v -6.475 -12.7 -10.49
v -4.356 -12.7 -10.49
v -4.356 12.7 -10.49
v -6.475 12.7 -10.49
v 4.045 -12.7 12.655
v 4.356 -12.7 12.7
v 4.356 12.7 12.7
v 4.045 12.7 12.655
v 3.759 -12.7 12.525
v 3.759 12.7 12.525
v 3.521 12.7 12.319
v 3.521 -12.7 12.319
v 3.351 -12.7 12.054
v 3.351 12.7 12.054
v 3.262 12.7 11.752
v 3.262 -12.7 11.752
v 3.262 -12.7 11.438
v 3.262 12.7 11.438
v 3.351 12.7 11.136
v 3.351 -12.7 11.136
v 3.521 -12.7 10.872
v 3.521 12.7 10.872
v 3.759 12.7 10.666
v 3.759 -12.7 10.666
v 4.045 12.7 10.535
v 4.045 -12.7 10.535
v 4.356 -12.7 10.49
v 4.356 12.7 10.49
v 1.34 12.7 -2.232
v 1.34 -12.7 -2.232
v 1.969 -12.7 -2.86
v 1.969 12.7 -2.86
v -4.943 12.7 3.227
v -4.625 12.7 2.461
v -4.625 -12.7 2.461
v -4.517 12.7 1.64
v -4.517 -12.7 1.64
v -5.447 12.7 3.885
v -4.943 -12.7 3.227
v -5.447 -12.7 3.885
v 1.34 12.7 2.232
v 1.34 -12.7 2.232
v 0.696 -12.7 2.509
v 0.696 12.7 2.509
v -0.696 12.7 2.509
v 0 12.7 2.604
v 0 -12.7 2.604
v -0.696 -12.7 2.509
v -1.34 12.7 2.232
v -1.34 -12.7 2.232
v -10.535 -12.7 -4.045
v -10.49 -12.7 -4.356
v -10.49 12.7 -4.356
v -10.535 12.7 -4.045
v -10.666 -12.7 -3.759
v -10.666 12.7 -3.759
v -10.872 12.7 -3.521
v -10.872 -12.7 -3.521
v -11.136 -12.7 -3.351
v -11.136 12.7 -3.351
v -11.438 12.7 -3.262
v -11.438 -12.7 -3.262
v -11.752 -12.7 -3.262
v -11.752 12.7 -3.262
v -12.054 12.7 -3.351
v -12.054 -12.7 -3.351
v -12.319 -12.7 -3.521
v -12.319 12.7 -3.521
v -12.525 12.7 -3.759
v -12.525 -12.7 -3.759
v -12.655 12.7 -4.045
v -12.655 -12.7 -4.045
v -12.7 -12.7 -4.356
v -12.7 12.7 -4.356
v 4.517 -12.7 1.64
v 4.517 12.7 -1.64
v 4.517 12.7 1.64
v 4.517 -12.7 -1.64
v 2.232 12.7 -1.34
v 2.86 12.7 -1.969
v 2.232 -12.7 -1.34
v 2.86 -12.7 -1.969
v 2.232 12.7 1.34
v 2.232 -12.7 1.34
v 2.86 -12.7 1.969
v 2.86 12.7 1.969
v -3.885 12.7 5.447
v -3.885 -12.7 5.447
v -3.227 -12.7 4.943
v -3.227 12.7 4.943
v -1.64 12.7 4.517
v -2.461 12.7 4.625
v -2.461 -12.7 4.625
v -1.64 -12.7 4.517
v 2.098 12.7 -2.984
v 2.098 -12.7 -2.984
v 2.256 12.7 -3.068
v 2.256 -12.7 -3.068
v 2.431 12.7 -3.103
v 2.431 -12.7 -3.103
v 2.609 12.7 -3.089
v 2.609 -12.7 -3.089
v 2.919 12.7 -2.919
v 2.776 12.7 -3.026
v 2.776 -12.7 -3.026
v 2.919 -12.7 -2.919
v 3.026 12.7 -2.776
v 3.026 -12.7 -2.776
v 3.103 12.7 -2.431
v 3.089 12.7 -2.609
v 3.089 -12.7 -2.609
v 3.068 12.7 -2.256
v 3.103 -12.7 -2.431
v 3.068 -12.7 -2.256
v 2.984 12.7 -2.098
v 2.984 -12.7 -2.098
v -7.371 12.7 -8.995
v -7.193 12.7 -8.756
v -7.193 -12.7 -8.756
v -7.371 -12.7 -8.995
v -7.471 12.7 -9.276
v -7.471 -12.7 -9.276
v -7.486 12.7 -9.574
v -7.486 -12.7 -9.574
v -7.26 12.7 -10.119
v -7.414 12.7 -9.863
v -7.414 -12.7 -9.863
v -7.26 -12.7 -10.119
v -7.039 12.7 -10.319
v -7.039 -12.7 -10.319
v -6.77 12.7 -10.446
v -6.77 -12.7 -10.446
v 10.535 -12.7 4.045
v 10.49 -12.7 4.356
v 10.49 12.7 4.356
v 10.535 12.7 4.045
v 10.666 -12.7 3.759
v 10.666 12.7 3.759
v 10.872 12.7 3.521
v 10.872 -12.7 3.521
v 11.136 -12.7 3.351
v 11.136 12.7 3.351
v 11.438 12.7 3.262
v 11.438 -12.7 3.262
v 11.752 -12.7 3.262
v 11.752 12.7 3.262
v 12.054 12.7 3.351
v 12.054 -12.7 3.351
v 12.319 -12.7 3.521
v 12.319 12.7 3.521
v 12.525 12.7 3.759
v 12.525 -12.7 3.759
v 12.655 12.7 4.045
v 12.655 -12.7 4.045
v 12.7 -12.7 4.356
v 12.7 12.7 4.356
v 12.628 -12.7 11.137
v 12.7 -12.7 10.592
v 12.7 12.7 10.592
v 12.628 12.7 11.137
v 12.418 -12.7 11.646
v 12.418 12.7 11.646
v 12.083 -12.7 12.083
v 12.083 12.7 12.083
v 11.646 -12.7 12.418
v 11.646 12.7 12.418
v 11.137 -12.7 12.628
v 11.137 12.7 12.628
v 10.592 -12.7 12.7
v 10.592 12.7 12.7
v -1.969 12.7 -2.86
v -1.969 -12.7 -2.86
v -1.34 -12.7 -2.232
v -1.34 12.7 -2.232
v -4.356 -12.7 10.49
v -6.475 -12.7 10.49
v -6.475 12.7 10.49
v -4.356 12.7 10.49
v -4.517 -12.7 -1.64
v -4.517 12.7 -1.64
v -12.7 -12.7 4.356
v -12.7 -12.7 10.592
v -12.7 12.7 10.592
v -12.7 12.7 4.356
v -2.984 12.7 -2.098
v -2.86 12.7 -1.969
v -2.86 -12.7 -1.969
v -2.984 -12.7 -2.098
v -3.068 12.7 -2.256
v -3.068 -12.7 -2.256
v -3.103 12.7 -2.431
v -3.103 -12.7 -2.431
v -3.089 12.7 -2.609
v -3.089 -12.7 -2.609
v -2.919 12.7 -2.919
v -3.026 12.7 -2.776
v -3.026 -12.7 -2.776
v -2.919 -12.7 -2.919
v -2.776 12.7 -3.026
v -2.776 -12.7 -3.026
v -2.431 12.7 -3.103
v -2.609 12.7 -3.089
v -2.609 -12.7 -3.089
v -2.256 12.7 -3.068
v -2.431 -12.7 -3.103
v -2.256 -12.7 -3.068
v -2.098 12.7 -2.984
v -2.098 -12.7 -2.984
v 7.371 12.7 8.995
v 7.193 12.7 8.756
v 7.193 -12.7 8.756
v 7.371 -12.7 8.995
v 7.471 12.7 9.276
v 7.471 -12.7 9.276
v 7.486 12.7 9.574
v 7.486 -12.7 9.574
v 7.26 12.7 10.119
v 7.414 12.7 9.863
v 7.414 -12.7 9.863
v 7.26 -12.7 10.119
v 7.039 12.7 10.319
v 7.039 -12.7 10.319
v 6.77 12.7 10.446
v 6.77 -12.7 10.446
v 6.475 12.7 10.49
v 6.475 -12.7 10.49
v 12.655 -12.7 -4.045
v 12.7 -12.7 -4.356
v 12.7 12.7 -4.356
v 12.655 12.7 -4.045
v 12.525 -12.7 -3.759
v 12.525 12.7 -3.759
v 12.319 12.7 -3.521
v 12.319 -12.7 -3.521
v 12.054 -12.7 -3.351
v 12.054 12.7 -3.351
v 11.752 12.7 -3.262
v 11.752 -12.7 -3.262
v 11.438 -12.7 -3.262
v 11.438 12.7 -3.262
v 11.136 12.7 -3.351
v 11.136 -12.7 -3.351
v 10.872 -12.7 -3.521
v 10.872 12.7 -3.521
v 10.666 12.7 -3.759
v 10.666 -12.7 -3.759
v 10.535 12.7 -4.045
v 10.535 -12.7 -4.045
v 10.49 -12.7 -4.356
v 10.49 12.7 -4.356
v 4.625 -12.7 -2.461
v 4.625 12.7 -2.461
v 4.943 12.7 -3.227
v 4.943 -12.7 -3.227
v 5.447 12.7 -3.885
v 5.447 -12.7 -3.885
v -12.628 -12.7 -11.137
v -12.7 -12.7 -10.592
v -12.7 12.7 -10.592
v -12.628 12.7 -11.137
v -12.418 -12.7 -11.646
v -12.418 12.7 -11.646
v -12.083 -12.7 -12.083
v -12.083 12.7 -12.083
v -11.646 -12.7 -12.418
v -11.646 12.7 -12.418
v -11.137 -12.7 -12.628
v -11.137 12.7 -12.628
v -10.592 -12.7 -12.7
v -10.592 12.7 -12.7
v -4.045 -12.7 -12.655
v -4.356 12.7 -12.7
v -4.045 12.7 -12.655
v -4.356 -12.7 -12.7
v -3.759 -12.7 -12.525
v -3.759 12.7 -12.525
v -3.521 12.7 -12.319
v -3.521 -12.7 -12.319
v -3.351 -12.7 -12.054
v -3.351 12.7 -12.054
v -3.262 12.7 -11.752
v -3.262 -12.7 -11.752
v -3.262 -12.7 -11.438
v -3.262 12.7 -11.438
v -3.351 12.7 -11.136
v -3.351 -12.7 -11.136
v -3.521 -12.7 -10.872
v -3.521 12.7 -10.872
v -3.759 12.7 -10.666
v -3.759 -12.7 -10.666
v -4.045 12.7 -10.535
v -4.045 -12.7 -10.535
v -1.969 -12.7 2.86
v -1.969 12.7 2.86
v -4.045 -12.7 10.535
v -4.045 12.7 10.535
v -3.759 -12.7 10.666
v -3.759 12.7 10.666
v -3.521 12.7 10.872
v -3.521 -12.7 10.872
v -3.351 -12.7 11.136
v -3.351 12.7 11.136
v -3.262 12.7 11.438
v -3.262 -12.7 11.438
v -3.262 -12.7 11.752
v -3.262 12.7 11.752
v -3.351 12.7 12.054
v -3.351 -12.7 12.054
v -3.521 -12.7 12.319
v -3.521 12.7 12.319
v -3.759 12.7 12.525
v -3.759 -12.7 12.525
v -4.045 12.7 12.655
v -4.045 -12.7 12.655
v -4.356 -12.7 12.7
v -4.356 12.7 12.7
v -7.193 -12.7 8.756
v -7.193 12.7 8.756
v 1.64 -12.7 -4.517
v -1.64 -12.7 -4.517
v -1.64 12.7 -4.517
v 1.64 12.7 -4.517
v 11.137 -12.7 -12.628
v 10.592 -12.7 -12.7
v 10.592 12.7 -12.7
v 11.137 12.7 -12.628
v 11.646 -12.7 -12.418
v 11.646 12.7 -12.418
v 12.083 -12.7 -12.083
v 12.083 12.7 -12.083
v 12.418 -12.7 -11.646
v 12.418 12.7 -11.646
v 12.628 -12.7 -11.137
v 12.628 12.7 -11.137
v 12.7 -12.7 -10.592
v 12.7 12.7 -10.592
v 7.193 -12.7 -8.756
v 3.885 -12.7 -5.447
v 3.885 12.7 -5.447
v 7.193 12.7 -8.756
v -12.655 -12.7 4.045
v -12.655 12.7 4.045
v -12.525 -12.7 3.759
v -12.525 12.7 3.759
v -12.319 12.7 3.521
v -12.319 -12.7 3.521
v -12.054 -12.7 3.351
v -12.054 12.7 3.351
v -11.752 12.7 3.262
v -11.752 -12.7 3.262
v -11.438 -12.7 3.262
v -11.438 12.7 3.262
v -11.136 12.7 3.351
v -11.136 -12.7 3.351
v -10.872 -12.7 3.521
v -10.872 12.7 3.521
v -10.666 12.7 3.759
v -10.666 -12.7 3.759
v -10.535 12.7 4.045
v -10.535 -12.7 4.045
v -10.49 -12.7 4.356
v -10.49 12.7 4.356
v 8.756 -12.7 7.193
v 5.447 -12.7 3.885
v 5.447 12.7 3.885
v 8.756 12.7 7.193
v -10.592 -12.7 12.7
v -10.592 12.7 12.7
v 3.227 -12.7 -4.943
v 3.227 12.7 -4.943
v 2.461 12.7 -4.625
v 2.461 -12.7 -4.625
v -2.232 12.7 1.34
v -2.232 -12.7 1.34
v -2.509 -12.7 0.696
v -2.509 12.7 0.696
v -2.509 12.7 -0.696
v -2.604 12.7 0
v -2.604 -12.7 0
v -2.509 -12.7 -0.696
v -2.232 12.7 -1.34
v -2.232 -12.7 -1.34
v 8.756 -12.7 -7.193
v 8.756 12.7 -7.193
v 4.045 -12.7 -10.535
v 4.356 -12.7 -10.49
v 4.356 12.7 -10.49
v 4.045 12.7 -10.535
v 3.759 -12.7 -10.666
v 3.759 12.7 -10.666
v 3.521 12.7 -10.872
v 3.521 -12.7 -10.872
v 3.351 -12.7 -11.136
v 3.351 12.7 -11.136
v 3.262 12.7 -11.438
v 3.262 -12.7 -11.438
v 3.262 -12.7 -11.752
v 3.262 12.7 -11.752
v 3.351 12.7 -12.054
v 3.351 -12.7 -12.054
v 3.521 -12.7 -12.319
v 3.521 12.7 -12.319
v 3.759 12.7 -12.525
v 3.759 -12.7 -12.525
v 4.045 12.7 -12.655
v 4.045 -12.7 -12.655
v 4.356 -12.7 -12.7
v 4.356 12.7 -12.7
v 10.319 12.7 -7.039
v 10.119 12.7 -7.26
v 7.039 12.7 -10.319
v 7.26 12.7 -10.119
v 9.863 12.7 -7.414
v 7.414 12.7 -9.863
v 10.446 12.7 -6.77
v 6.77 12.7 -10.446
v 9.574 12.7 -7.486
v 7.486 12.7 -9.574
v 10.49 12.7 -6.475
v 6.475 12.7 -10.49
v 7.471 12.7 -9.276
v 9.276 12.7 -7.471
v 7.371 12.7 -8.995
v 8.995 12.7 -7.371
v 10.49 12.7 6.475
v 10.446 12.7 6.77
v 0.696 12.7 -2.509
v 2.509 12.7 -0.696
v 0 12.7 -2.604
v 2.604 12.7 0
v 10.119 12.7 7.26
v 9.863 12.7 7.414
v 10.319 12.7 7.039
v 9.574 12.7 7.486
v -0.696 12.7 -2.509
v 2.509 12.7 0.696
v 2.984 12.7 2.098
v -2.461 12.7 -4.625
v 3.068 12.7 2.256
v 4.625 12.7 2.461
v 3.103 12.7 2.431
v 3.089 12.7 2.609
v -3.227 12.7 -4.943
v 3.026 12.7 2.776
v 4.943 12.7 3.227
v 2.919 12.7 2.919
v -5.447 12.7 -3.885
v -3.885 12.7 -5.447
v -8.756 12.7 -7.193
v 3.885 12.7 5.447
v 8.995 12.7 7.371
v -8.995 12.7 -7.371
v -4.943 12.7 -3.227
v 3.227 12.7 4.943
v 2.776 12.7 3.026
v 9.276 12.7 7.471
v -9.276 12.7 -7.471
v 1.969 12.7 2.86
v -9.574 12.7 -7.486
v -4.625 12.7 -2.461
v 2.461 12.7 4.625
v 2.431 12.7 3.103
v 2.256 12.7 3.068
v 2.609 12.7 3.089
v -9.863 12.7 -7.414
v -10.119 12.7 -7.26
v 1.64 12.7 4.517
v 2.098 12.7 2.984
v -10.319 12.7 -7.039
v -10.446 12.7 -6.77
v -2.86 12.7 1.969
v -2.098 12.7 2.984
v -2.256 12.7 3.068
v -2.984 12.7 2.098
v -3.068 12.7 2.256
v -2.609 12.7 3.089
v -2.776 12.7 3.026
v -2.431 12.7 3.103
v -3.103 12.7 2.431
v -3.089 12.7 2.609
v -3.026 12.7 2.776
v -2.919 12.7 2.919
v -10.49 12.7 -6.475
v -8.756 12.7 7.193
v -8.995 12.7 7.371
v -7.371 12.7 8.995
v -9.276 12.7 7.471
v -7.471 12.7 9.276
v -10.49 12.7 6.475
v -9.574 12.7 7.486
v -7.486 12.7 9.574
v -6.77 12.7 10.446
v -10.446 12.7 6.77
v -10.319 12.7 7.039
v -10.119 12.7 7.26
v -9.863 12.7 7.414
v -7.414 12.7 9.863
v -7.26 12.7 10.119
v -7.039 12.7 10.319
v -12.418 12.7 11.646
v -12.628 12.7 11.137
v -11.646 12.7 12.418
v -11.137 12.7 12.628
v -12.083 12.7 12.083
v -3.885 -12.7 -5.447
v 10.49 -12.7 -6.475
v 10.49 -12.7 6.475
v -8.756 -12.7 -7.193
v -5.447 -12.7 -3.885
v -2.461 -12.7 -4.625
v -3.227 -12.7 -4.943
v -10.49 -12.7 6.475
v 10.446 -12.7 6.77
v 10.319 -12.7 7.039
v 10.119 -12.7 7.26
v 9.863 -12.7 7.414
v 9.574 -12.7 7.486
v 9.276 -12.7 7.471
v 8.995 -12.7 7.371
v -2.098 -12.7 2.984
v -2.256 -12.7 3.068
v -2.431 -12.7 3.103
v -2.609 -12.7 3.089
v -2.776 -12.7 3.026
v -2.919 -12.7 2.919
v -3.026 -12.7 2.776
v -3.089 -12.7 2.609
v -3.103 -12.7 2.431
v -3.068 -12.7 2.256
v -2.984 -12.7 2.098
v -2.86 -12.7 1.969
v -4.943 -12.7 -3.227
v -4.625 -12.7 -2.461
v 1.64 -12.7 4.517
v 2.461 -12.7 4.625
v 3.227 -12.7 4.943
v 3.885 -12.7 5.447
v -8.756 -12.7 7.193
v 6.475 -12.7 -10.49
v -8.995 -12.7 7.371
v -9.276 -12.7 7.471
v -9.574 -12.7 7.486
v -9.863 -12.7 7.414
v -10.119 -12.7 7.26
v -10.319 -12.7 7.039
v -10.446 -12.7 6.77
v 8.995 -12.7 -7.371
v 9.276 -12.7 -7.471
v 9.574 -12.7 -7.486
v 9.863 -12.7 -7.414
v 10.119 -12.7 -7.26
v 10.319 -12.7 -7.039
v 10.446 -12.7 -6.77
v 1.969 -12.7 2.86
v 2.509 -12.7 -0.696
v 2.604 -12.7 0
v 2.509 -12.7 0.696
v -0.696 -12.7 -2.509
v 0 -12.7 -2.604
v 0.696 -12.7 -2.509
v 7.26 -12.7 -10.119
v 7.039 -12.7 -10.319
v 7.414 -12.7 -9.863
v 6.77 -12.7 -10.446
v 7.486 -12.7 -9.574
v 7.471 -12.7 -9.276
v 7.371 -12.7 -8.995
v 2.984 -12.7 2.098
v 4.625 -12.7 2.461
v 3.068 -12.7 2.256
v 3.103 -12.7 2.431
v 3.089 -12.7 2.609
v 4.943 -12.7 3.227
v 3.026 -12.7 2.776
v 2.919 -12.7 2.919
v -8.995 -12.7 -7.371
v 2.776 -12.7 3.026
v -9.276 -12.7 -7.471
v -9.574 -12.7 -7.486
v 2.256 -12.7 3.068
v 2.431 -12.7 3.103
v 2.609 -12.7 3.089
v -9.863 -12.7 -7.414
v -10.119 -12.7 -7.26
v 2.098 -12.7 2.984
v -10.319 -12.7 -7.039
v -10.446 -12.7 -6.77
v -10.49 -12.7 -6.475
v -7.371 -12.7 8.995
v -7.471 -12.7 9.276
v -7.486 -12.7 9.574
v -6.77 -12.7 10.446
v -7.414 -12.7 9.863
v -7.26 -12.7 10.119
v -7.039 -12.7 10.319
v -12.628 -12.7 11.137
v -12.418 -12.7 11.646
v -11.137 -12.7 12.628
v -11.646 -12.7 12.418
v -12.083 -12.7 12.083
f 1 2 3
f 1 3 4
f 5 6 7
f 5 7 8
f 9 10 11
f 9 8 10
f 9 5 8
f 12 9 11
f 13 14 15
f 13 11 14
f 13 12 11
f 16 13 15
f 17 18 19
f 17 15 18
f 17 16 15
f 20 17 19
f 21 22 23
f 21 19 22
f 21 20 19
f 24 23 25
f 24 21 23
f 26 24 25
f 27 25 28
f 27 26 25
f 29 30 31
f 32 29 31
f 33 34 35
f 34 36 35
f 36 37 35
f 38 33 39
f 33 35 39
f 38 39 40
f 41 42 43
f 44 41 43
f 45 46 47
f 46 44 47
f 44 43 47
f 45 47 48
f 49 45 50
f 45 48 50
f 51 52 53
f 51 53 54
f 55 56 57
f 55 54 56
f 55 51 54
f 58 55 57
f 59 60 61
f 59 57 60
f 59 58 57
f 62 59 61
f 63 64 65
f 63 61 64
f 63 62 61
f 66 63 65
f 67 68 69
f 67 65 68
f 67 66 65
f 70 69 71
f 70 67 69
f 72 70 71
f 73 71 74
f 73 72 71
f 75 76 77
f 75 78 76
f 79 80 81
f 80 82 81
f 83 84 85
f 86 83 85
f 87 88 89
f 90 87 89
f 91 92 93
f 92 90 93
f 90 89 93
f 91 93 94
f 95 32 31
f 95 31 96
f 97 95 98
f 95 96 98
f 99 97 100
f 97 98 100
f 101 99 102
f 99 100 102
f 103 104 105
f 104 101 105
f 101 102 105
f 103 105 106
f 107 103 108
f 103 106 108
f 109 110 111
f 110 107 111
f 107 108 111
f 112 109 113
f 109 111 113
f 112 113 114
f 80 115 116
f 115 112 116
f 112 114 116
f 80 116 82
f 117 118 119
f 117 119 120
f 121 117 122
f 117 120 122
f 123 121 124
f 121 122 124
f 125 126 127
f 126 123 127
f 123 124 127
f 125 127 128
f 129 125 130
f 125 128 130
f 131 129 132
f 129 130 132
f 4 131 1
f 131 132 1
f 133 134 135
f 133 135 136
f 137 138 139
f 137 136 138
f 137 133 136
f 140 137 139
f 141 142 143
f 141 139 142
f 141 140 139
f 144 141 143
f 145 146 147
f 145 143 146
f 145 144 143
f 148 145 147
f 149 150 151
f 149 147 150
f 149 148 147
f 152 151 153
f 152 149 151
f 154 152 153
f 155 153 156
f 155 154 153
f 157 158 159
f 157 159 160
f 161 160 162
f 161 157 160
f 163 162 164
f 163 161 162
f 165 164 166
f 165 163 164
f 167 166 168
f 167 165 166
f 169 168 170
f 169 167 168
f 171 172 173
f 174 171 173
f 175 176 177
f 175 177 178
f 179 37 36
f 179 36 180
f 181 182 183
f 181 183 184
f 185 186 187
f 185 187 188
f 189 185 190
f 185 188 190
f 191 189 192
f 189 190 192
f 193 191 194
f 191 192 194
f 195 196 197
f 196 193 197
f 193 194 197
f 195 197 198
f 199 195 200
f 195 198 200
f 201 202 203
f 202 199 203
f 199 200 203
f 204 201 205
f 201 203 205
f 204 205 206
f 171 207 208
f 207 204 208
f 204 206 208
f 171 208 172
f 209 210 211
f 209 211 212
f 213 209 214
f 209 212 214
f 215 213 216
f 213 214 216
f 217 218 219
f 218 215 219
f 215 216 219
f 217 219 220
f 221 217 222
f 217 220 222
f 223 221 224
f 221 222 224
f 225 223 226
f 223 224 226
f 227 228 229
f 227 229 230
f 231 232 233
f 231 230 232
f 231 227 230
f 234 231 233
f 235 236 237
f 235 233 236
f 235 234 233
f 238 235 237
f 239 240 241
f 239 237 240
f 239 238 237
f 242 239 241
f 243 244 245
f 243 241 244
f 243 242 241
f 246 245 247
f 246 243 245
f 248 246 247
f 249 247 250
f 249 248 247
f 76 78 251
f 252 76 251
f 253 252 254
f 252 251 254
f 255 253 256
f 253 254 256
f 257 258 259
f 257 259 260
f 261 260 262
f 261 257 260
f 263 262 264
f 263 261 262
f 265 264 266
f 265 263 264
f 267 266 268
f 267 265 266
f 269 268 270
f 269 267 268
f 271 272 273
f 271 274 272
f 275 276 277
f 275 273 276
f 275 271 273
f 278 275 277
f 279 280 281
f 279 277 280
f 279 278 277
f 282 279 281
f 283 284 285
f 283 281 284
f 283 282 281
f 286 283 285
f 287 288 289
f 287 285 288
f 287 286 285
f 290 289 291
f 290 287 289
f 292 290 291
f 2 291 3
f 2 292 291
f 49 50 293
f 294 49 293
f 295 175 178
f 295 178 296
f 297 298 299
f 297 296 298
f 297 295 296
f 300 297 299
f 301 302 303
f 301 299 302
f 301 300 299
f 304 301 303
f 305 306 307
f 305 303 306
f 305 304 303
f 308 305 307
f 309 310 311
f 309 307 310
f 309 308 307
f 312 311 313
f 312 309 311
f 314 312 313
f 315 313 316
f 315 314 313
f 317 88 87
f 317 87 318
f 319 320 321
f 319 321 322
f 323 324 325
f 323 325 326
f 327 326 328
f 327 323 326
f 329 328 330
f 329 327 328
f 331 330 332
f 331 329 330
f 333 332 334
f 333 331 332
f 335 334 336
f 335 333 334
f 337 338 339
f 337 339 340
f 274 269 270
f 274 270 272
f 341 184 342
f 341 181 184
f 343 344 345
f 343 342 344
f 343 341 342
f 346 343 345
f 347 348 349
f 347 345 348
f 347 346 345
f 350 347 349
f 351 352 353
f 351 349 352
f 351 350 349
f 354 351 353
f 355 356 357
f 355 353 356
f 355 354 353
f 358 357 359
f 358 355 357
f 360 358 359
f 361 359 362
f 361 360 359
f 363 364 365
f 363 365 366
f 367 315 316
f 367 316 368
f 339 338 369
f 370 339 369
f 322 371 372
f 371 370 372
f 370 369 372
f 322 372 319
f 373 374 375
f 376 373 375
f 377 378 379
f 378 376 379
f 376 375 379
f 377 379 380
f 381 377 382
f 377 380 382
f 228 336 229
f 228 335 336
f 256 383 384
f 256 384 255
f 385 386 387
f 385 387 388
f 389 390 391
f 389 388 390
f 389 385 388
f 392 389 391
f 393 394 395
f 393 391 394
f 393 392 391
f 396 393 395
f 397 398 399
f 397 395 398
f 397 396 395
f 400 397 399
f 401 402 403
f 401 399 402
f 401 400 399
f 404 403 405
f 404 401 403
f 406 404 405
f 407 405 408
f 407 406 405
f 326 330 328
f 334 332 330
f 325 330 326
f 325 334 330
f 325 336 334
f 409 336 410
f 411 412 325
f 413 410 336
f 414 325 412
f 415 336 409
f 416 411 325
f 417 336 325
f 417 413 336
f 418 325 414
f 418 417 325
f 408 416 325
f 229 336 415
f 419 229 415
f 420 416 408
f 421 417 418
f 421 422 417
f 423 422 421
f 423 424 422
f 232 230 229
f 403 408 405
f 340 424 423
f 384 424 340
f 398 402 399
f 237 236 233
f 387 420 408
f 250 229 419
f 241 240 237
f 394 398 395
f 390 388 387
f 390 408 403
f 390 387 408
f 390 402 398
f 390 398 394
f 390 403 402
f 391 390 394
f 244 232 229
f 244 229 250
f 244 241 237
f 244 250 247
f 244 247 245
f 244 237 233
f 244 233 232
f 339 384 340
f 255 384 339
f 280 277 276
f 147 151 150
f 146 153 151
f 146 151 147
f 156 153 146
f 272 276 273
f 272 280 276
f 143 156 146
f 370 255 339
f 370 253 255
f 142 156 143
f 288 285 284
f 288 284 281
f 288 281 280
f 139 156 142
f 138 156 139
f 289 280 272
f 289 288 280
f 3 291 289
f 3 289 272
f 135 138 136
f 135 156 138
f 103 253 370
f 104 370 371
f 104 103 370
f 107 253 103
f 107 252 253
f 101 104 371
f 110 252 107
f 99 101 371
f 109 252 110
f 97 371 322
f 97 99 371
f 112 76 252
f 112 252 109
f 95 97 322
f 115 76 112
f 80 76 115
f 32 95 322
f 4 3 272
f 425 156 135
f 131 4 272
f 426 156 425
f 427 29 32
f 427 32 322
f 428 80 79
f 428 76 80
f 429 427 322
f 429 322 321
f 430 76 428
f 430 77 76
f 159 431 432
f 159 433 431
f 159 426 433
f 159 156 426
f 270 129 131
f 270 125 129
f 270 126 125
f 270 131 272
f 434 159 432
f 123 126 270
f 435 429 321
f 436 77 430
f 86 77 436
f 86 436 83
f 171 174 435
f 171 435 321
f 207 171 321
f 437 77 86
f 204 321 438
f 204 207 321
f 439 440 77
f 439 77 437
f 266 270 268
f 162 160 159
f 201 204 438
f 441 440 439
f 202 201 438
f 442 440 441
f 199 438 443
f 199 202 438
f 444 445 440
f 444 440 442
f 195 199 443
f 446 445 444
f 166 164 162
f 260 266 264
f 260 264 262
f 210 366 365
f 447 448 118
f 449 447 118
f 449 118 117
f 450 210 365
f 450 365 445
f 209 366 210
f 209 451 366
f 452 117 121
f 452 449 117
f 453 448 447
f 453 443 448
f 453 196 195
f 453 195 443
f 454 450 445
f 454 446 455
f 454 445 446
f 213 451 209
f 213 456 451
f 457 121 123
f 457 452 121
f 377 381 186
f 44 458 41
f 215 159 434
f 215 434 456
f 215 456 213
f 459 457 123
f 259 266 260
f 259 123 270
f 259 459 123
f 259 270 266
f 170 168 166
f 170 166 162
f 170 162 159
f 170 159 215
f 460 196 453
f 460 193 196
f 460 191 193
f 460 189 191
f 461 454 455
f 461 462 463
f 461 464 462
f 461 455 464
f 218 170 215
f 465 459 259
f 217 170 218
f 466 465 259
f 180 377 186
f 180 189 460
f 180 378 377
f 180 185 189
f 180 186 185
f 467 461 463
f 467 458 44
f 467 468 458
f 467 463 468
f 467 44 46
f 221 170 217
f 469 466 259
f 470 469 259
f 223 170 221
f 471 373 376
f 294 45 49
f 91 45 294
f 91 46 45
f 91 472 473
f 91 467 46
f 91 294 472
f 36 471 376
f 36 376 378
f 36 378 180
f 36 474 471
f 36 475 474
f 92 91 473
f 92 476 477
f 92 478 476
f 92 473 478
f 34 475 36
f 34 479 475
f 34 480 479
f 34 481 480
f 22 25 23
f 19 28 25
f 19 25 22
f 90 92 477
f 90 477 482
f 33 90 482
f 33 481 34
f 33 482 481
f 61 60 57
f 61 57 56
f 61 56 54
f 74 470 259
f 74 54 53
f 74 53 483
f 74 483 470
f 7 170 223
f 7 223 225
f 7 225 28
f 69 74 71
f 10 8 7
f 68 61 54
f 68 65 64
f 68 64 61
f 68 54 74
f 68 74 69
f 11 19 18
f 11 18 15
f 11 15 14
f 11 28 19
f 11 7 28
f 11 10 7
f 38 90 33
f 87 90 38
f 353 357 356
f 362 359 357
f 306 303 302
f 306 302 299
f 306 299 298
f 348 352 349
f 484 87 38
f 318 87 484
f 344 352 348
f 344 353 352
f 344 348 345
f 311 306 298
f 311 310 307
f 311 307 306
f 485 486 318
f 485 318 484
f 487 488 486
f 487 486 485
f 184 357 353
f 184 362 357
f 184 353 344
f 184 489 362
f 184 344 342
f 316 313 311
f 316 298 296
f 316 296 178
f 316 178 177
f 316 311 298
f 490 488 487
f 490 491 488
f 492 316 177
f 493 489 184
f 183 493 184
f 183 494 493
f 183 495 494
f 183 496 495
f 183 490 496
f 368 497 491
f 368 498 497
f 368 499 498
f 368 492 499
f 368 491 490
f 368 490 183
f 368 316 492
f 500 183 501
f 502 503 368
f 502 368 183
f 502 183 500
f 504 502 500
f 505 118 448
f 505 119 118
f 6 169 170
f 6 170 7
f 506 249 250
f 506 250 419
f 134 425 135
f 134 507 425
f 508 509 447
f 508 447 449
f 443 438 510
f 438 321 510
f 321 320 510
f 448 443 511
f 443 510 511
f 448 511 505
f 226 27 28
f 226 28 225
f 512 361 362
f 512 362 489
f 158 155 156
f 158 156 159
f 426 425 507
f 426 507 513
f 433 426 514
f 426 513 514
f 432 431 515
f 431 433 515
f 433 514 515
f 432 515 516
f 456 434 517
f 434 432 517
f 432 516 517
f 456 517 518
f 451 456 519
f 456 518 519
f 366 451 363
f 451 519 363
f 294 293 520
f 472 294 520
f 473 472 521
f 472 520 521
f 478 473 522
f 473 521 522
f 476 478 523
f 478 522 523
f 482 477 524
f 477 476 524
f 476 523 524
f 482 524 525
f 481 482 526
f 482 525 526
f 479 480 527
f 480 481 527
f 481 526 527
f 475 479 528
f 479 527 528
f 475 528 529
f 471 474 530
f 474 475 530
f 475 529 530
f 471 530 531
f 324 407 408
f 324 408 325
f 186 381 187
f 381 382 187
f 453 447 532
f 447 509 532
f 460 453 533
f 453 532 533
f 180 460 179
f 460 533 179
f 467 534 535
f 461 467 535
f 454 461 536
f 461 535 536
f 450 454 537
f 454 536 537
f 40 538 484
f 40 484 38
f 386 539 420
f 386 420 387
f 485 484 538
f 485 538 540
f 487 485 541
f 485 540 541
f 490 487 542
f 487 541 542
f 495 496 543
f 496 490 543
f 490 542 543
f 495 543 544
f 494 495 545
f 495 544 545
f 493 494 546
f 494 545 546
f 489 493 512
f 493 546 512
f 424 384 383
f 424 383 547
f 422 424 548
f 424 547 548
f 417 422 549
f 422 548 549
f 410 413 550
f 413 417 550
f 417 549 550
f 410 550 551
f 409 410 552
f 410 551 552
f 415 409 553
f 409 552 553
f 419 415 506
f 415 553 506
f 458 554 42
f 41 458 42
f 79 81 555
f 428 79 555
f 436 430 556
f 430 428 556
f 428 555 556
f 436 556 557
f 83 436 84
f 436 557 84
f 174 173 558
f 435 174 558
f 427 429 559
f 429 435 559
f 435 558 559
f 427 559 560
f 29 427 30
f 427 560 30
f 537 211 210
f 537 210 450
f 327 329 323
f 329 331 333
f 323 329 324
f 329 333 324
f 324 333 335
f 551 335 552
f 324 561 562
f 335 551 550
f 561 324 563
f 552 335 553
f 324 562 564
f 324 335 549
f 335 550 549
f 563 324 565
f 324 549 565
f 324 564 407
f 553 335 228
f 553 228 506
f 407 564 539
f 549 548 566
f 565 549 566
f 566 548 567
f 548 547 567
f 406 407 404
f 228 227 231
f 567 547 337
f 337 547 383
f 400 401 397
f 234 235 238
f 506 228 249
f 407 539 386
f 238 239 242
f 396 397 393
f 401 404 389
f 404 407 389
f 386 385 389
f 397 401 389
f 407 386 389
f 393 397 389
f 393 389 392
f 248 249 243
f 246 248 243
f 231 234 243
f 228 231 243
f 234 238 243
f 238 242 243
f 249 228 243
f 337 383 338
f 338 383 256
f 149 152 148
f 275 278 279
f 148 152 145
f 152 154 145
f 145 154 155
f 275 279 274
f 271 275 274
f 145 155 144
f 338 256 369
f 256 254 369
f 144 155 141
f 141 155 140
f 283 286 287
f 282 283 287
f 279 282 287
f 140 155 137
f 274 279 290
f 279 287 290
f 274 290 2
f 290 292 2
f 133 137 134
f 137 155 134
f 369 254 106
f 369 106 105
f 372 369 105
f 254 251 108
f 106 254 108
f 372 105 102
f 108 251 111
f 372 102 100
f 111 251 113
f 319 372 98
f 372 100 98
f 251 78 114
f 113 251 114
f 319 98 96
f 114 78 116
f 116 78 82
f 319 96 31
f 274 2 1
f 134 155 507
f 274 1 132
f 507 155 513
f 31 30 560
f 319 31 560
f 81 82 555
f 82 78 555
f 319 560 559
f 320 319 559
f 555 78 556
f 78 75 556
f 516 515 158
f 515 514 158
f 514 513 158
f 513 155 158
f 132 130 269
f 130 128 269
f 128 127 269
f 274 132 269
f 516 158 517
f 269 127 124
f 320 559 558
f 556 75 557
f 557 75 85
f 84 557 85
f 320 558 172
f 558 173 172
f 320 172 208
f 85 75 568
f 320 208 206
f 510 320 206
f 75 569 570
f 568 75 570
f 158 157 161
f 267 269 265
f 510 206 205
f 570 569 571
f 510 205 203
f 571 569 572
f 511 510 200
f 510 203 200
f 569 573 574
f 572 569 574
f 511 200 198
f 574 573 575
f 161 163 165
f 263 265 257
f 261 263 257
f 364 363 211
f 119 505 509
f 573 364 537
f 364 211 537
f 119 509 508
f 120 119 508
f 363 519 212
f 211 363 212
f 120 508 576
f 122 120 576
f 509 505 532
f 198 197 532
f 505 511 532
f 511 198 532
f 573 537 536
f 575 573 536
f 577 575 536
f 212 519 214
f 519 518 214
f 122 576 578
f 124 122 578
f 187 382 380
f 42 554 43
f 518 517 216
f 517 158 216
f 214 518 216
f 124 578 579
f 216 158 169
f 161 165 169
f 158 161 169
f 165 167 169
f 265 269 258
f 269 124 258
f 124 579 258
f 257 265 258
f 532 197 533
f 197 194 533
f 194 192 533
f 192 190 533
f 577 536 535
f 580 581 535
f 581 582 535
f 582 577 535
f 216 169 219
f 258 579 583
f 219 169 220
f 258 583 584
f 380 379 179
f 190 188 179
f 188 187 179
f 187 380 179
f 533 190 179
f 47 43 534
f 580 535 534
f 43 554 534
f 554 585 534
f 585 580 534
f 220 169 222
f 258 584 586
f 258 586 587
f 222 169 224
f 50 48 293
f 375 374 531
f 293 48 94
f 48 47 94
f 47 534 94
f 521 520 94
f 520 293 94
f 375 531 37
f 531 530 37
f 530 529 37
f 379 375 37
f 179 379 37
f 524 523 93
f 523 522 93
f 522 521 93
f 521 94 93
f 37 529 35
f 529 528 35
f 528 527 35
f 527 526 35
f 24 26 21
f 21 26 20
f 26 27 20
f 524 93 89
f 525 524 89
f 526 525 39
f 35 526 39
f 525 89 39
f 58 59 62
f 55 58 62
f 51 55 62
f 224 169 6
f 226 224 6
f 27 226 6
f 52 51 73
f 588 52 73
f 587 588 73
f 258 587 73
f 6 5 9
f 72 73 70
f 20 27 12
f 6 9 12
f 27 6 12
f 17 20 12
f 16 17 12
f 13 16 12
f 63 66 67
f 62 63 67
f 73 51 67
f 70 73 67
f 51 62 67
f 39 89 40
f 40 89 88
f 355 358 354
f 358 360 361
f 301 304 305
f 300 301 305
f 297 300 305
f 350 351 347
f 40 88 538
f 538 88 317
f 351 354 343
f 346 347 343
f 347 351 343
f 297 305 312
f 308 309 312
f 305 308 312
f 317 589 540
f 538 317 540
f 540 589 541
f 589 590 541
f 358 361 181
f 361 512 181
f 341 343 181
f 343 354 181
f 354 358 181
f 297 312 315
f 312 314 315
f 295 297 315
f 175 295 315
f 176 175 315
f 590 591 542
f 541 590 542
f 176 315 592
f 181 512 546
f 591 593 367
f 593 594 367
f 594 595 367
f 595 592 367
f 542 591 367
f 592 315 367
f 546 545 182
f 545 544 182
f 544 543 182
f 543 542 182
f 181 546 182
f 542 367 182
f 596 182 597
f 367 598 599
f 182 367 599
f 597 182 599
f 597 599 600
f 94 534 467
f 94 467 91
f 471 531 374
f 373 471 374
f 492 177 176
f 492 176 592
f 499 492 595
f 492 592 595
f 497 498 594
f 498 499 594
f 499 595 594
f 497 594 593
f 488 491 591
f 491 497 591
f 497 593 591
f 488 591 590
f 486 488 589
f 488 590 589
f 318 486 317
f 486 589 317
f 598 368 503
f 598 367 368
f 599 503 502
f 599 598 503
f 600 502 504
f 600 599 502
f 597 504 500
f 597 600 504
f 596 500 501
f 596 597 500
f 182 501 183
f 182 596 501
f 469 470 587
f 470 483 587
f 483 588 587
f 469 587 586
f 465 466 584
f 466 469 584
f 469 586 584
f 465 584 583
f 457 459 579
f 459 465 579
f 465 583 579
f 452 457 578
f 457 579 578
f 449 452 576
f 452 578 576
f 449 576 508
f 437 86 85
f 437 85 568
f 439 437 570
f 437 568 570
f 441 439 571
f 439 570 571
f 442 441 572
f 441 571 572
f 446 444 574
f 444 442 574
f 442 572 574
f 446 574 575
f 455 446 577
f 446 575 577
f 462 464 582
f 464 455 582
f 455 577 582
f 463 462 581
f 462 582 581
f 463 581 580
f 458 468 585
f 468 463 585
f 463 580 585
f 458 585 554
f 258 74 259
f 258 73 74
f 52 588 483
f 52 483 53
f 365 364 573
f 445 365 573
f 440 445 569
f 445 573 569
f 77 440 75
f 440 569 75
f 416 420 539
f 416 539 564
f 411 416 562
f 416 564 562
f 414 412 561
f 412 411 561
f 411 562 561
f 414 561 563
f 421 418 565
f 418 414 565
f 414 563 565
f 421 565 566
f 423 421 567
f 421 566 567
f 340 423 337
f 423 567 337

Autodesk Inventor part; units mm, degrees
ref_plane "YZ Plane" through (0, 0, 0) normal (1, 0, 0) x (0, 1, 0)
ref_plane "XZ Plane" through (0, 0, 0) normal (0, 1, 0) x (-1, 0, 0)
ref_plane "XY Plane" through (0, 0, 0) normal (0, 0, 1) x (1, 0, 0)
sketch "Sketch1" plane through (0, 0, 0) normal (0, 1, 0) x (-1, 0, 0)
  arc A0 (-1.9692, 2.8605) -> (-2.8605, 1.9692) centre (-2.4696, 2.4696) ccw
  line L0 (-2.2319, 1.3405) -> (-2.8605, 1.9692)
  arc A1 (-2.2319, 1.3405) -> (-2.2319, -1.3405) centre (0, 0) ccw
  line L1 (-2.8605, -1.9692) -> (-2.2319, -1.3405)
  arc A2 (-2.8605, -1.9692) -> (-1.9692, -2.8605) centre (-2.4696, -2.4696) ccw
  line L2 (-1.3405, -2.2319) -> (-1.9692, -2.8605)
  arc A3 (-1.3405, -2.2319) -> (1.3405, -2.2319) centre (0, 0) ccw
  line L3 (1.9692, -2.8605) -> (1.3405, -2.2319)
  arc A4 (1.9692, -2.8605) -> (2.8605, -1.9692) centre (2.4696, -2.4696) ccw
  line L4 (2.2319, -1.3405) -> (2.8605, -1.9692)
  arc A5 (2.2319, -1.3405) -> (2.2319, 1.3405) centre (0, 0) ccw
  line L5 (2.8605, 1.9692) -> (2.2319, 1.3405)
  arc A6 (2.8605, 1.9692) -> (1.9692, 2.8605) centre (2.4696, 2.4696) ccw
  line L6 (1.3405, 2.2319) -> (1.9692, 2.8605)
  arc A7 (1.3405, 2.2319) -> (-1.3405, 2.2319) centre (0, 0) ccw
  line L7 (-1.9692, 2.8605) -> (-1.3405, 2.2319)
  arc A8 (-1.6396, -4.5172) -> (-3.8846, -5.4471) centre (-1.6396, -7.6922) ccw
  line L8 (-3.8846, -5.4471) -> (-7.1933, -8.7558)
  arc A9 (-7.1933, -8.7558) -> (-6.4749, -10.4902) centre (-6.4749, -9.4742) ccw
  line L9 (-6.4749, -10.4902) -> (-4.3561, -10.4902)
  arc A10 (-4.3561, -12.7) -> (-4.3561, -10.4902) centre (-4.3561, -11.5951) ccw
  line L10 (-4.3561, -12.7) -> (-10.5918, -12.7)
  arc A11 (-12.7, -10.5918) -> (-10.5918, -12.7) centre (-10.5918, -10.5918) ccw
  line L11 (-12.7, -10.5918) -> (-12.7, -4.3561)
  arc A12 (-10.4902, -4.3561) -> (-12.7, -4.3561) centre (-11.5951, -4.3561) ccw
  line L12 (-10.4902, -4.3561) -> (-10.4902, -6.4749)
  arc A13 (-10.4902, -6.4749) -> (-8.7558, -7.1933) centre (-9.4742, -6.4749) ccw
  line L13 (-8.7558, -7.1933) -> (-5.4471, -3.8846)
  arc A14 (-5.4471, -3.8846) -> (-4.5172, -1.6396) centre (-7.6922, -1.6396) ccw
  line L14 (-4.5172, -1.6396) -> (-4.5172, 1.6396)
  arc A15 (-4.5172, 1.6396) -> (-5.4471, 3.8846) centre (-7.6922, 1.6396) ccw
  line L15 (-5.4471, 3.8846) -> (-8.7558, 7.1933)
  arc A16 (-8.7558, 7.1933) -> (-10.4902, 6.4749) centre (-9.4742, 6.4749) ccw
  line L16 (-10.4902, 6.4749) -> (-10.4902, 4.3561)
  arc A17 (-12.7, 4.3561) -> (-10.4902, 4.3561) centre (-11.5951, 4.3561) ccw
  line L17 (-12.7, 4.3561) -> (-12.7, 10.5918)
  arc A18 (-10.5918, 12.7) -> (-12.7, 10.5918) centre (-10.5918, 10.5918) ccw
  line L18 (-10.5918, 12.7) -> (-4.3561, 12.7)
  arc A19 (-4.3561, 10.4902) -> (-4.3561, 12.7) centre (-4.3561, 11.5951) ccw
  line L19 (-4.3561, 10.4902) -> (-6.4749, 10.4902)
  arc A20 (-6.4749, 10.4902) -> (-7.1933, 8.7558) centre (-6.4749, 9.4742) ccw
  line L20 (-7.1933, 8.7558) -> (-3.8846, 5.4471)
  arc A21 (-3.8846, 5.4471) -> (-1.6396, 4.5172) centre (-1.6396, 7.6922) ccw
  line L21 (-1.6396, 4.5172) -> (1.6396, 4.5172)
  arc A22 (1.6396, 4.5172) -> (3.8846, 5.4471) centre (1.6396, 7.6922) ccw
  line L22 (3.8846, 5.4471) -> (7.1933, 8.7558)
  arc A23 (7.1933, 8.7558) -> (6.4749, 10.4902) centre (6.4749, 9.4742) ccw
  line L23 (6.4749, 10.4902) -> (4.3561, 10.4902)
  arc A24 (4.3561, 12.7) -> (4.3561, 10.4902) centre (4.3561, 11.5951) ccw
  line L24 (4.3561, 12.7) -> (10.5918, 12.7)
  arc A25 (12.7, 10.5918) -> (10.5918, 12.7) centre (10.5918, 10.5918) ccw
  line L25 (12.7, 10.5918) -> (12.7, 4.3561)
  arc A26 (10.4902, 4.3561) -> (12.7, 4.3561) centre (11.5951, 4.3561) ccw
  line L26 (10.4902, 4.3561) -> (10.4902, 6.4749)
  arc A27 (10.4902, 6.4749) -> (8.7558, 7.1933) centre (9.4742, 6.4749) ccw
  line L27 (8.7558, 7.1933) -> (5.4471, 3.8846)
  arc A28 (5.4471, 3.8846) -> (4.5172, 1.6396) centre (7.6922, 1.6396) ccw
  line L28 (4.5172, 1.6396) -> (4.5172, -1.6396)
  arc A29 (4.5172, -1.6396) -> (5.4471, -3.8846) centre (7.6922, -1.6396) ccw
  line L29 (5.4471, -3.8846) -> (8.7558, -7.1933)
  arc A30 (8.7558, -7.1933) -> (10.4902, -6.4749) centre (9.4742, -6.4749) ccw
  line L30 (10.4902, -6.4749) -> (10.4902, -4.3561)
  arc A31 (12.7, -4.3561) -> (10.4902, -4.3561) centre (11.5951, -4.3561) ccw
  line L31 (12.7, -4.3561) -> (12.7, -10.5918)
  arc A32 (10.5918, -12.7) -> (12.7, -10.5918) centre (10.5918, -10.5918) ccw
  line L32 (10.5918, -12.7) -> (4.3561, -12.7)
  arc A33 (4.3561, -10.4902) -> (4.3561, -12.7) centre (4.3561, -11.5951) ccw
  line L33 (4.3561, -10.4902) -> (6.4749, -10.4902)
  arc A34 (6.4749, -10.4902) -> (7.1933, -8.7558) centre (6.4749, -9.4742) ccw
  line L34 (7.1933, -8.7558) -> (3.8846, -5.4471)
  arc A35 (3.8846, -5.4471) -> (1.6396, -4.5172) centre (1.6396, -7.6922) ccw
  line L35 (1.6396, -4.5172) -> (-1.6396, -4.5172)
  dimension "d0" = 1.1049
  dimension "d1" = 2.1082
  dimension "d2" = 1.016
  dimension "d3" = 3.175
  dimension "d4" = 0.635
  dimension "d5" = 2.6035
  dimension "d6" = 2.6035
  dimension "d7" = 2.6035
  dimension "d8" = 2.6035
  dimension "d9" = 45
  dimension "d10" = 45
  dimension "d11" = 45
  dimension "d12" = 45
  dimension "d13" = 45
  dimension "d14" = 45
  dimension "d15" = 45
  dimension "d16" = 90
  dimension "d17" = 90
  dimension "d18" = 45
  dimension "d19" = 45
  dimension "d20" = 90
  dimension "d21" = 90
  dimension "d22" = 90
  dimension "d23" = 90
  dimension "d24" = 90
  dimension "d25" = 90
  dimension "d26" = 8.1828
  dimension "d27" = 17.2172
  dimension "d28" = 23.1902
  dimension "d29" = 25.4
  dimension "d30" = 8.1828
  dimension "d31" = 17.2172
  dimension "d32" = 2.2096
  dimension "d33" = 0.4746
  dimension "d34" = 1.7351
  dimension "d35" = 1.2605
  dimension "d36" = 0.4746
  dimension "d37" = 1.7351
  dimension "d38" = 12.7
  dimension "d39" = 12.7
  dimension "d40" = 10.4902
  dimension "d41" = 12.7
  dimension "d42" = 1.1048
  dimension "d43" = 1.1048
  dimension "d44" = 1.1048
  dimension "d45" = 0.6303
  dimension "d46" = 0.6303
  dimension "d47" = 0.6303
  dimension "d48" = 0.6303
  dimension "d49" = 0.6303
  dimension "d50" = 10.4902
  dimension "d51" = 10.4902
  dimension "d52" = 1.1048
  dimension "d53" = 1.1048
  dimension "d54" = 12.7
  dimension "d55" = 12.7
  dimension "d56" = 10.4902
  dimension "d57" = 12.7
  dimension "d58" = 8.3439
  dimension "d59" = 17.0561
  dimension "d60" = 8.3439
  dimension "d61" = 8.3439
  dimension "d62" = 9.8395
  dimension "d63" = 9.8395
extrude "Extrusion1" add sketch "Sketch1" along normal mid plane 25.4
properties part number "1010-S-BLACK-FB" material "6061-T6"
